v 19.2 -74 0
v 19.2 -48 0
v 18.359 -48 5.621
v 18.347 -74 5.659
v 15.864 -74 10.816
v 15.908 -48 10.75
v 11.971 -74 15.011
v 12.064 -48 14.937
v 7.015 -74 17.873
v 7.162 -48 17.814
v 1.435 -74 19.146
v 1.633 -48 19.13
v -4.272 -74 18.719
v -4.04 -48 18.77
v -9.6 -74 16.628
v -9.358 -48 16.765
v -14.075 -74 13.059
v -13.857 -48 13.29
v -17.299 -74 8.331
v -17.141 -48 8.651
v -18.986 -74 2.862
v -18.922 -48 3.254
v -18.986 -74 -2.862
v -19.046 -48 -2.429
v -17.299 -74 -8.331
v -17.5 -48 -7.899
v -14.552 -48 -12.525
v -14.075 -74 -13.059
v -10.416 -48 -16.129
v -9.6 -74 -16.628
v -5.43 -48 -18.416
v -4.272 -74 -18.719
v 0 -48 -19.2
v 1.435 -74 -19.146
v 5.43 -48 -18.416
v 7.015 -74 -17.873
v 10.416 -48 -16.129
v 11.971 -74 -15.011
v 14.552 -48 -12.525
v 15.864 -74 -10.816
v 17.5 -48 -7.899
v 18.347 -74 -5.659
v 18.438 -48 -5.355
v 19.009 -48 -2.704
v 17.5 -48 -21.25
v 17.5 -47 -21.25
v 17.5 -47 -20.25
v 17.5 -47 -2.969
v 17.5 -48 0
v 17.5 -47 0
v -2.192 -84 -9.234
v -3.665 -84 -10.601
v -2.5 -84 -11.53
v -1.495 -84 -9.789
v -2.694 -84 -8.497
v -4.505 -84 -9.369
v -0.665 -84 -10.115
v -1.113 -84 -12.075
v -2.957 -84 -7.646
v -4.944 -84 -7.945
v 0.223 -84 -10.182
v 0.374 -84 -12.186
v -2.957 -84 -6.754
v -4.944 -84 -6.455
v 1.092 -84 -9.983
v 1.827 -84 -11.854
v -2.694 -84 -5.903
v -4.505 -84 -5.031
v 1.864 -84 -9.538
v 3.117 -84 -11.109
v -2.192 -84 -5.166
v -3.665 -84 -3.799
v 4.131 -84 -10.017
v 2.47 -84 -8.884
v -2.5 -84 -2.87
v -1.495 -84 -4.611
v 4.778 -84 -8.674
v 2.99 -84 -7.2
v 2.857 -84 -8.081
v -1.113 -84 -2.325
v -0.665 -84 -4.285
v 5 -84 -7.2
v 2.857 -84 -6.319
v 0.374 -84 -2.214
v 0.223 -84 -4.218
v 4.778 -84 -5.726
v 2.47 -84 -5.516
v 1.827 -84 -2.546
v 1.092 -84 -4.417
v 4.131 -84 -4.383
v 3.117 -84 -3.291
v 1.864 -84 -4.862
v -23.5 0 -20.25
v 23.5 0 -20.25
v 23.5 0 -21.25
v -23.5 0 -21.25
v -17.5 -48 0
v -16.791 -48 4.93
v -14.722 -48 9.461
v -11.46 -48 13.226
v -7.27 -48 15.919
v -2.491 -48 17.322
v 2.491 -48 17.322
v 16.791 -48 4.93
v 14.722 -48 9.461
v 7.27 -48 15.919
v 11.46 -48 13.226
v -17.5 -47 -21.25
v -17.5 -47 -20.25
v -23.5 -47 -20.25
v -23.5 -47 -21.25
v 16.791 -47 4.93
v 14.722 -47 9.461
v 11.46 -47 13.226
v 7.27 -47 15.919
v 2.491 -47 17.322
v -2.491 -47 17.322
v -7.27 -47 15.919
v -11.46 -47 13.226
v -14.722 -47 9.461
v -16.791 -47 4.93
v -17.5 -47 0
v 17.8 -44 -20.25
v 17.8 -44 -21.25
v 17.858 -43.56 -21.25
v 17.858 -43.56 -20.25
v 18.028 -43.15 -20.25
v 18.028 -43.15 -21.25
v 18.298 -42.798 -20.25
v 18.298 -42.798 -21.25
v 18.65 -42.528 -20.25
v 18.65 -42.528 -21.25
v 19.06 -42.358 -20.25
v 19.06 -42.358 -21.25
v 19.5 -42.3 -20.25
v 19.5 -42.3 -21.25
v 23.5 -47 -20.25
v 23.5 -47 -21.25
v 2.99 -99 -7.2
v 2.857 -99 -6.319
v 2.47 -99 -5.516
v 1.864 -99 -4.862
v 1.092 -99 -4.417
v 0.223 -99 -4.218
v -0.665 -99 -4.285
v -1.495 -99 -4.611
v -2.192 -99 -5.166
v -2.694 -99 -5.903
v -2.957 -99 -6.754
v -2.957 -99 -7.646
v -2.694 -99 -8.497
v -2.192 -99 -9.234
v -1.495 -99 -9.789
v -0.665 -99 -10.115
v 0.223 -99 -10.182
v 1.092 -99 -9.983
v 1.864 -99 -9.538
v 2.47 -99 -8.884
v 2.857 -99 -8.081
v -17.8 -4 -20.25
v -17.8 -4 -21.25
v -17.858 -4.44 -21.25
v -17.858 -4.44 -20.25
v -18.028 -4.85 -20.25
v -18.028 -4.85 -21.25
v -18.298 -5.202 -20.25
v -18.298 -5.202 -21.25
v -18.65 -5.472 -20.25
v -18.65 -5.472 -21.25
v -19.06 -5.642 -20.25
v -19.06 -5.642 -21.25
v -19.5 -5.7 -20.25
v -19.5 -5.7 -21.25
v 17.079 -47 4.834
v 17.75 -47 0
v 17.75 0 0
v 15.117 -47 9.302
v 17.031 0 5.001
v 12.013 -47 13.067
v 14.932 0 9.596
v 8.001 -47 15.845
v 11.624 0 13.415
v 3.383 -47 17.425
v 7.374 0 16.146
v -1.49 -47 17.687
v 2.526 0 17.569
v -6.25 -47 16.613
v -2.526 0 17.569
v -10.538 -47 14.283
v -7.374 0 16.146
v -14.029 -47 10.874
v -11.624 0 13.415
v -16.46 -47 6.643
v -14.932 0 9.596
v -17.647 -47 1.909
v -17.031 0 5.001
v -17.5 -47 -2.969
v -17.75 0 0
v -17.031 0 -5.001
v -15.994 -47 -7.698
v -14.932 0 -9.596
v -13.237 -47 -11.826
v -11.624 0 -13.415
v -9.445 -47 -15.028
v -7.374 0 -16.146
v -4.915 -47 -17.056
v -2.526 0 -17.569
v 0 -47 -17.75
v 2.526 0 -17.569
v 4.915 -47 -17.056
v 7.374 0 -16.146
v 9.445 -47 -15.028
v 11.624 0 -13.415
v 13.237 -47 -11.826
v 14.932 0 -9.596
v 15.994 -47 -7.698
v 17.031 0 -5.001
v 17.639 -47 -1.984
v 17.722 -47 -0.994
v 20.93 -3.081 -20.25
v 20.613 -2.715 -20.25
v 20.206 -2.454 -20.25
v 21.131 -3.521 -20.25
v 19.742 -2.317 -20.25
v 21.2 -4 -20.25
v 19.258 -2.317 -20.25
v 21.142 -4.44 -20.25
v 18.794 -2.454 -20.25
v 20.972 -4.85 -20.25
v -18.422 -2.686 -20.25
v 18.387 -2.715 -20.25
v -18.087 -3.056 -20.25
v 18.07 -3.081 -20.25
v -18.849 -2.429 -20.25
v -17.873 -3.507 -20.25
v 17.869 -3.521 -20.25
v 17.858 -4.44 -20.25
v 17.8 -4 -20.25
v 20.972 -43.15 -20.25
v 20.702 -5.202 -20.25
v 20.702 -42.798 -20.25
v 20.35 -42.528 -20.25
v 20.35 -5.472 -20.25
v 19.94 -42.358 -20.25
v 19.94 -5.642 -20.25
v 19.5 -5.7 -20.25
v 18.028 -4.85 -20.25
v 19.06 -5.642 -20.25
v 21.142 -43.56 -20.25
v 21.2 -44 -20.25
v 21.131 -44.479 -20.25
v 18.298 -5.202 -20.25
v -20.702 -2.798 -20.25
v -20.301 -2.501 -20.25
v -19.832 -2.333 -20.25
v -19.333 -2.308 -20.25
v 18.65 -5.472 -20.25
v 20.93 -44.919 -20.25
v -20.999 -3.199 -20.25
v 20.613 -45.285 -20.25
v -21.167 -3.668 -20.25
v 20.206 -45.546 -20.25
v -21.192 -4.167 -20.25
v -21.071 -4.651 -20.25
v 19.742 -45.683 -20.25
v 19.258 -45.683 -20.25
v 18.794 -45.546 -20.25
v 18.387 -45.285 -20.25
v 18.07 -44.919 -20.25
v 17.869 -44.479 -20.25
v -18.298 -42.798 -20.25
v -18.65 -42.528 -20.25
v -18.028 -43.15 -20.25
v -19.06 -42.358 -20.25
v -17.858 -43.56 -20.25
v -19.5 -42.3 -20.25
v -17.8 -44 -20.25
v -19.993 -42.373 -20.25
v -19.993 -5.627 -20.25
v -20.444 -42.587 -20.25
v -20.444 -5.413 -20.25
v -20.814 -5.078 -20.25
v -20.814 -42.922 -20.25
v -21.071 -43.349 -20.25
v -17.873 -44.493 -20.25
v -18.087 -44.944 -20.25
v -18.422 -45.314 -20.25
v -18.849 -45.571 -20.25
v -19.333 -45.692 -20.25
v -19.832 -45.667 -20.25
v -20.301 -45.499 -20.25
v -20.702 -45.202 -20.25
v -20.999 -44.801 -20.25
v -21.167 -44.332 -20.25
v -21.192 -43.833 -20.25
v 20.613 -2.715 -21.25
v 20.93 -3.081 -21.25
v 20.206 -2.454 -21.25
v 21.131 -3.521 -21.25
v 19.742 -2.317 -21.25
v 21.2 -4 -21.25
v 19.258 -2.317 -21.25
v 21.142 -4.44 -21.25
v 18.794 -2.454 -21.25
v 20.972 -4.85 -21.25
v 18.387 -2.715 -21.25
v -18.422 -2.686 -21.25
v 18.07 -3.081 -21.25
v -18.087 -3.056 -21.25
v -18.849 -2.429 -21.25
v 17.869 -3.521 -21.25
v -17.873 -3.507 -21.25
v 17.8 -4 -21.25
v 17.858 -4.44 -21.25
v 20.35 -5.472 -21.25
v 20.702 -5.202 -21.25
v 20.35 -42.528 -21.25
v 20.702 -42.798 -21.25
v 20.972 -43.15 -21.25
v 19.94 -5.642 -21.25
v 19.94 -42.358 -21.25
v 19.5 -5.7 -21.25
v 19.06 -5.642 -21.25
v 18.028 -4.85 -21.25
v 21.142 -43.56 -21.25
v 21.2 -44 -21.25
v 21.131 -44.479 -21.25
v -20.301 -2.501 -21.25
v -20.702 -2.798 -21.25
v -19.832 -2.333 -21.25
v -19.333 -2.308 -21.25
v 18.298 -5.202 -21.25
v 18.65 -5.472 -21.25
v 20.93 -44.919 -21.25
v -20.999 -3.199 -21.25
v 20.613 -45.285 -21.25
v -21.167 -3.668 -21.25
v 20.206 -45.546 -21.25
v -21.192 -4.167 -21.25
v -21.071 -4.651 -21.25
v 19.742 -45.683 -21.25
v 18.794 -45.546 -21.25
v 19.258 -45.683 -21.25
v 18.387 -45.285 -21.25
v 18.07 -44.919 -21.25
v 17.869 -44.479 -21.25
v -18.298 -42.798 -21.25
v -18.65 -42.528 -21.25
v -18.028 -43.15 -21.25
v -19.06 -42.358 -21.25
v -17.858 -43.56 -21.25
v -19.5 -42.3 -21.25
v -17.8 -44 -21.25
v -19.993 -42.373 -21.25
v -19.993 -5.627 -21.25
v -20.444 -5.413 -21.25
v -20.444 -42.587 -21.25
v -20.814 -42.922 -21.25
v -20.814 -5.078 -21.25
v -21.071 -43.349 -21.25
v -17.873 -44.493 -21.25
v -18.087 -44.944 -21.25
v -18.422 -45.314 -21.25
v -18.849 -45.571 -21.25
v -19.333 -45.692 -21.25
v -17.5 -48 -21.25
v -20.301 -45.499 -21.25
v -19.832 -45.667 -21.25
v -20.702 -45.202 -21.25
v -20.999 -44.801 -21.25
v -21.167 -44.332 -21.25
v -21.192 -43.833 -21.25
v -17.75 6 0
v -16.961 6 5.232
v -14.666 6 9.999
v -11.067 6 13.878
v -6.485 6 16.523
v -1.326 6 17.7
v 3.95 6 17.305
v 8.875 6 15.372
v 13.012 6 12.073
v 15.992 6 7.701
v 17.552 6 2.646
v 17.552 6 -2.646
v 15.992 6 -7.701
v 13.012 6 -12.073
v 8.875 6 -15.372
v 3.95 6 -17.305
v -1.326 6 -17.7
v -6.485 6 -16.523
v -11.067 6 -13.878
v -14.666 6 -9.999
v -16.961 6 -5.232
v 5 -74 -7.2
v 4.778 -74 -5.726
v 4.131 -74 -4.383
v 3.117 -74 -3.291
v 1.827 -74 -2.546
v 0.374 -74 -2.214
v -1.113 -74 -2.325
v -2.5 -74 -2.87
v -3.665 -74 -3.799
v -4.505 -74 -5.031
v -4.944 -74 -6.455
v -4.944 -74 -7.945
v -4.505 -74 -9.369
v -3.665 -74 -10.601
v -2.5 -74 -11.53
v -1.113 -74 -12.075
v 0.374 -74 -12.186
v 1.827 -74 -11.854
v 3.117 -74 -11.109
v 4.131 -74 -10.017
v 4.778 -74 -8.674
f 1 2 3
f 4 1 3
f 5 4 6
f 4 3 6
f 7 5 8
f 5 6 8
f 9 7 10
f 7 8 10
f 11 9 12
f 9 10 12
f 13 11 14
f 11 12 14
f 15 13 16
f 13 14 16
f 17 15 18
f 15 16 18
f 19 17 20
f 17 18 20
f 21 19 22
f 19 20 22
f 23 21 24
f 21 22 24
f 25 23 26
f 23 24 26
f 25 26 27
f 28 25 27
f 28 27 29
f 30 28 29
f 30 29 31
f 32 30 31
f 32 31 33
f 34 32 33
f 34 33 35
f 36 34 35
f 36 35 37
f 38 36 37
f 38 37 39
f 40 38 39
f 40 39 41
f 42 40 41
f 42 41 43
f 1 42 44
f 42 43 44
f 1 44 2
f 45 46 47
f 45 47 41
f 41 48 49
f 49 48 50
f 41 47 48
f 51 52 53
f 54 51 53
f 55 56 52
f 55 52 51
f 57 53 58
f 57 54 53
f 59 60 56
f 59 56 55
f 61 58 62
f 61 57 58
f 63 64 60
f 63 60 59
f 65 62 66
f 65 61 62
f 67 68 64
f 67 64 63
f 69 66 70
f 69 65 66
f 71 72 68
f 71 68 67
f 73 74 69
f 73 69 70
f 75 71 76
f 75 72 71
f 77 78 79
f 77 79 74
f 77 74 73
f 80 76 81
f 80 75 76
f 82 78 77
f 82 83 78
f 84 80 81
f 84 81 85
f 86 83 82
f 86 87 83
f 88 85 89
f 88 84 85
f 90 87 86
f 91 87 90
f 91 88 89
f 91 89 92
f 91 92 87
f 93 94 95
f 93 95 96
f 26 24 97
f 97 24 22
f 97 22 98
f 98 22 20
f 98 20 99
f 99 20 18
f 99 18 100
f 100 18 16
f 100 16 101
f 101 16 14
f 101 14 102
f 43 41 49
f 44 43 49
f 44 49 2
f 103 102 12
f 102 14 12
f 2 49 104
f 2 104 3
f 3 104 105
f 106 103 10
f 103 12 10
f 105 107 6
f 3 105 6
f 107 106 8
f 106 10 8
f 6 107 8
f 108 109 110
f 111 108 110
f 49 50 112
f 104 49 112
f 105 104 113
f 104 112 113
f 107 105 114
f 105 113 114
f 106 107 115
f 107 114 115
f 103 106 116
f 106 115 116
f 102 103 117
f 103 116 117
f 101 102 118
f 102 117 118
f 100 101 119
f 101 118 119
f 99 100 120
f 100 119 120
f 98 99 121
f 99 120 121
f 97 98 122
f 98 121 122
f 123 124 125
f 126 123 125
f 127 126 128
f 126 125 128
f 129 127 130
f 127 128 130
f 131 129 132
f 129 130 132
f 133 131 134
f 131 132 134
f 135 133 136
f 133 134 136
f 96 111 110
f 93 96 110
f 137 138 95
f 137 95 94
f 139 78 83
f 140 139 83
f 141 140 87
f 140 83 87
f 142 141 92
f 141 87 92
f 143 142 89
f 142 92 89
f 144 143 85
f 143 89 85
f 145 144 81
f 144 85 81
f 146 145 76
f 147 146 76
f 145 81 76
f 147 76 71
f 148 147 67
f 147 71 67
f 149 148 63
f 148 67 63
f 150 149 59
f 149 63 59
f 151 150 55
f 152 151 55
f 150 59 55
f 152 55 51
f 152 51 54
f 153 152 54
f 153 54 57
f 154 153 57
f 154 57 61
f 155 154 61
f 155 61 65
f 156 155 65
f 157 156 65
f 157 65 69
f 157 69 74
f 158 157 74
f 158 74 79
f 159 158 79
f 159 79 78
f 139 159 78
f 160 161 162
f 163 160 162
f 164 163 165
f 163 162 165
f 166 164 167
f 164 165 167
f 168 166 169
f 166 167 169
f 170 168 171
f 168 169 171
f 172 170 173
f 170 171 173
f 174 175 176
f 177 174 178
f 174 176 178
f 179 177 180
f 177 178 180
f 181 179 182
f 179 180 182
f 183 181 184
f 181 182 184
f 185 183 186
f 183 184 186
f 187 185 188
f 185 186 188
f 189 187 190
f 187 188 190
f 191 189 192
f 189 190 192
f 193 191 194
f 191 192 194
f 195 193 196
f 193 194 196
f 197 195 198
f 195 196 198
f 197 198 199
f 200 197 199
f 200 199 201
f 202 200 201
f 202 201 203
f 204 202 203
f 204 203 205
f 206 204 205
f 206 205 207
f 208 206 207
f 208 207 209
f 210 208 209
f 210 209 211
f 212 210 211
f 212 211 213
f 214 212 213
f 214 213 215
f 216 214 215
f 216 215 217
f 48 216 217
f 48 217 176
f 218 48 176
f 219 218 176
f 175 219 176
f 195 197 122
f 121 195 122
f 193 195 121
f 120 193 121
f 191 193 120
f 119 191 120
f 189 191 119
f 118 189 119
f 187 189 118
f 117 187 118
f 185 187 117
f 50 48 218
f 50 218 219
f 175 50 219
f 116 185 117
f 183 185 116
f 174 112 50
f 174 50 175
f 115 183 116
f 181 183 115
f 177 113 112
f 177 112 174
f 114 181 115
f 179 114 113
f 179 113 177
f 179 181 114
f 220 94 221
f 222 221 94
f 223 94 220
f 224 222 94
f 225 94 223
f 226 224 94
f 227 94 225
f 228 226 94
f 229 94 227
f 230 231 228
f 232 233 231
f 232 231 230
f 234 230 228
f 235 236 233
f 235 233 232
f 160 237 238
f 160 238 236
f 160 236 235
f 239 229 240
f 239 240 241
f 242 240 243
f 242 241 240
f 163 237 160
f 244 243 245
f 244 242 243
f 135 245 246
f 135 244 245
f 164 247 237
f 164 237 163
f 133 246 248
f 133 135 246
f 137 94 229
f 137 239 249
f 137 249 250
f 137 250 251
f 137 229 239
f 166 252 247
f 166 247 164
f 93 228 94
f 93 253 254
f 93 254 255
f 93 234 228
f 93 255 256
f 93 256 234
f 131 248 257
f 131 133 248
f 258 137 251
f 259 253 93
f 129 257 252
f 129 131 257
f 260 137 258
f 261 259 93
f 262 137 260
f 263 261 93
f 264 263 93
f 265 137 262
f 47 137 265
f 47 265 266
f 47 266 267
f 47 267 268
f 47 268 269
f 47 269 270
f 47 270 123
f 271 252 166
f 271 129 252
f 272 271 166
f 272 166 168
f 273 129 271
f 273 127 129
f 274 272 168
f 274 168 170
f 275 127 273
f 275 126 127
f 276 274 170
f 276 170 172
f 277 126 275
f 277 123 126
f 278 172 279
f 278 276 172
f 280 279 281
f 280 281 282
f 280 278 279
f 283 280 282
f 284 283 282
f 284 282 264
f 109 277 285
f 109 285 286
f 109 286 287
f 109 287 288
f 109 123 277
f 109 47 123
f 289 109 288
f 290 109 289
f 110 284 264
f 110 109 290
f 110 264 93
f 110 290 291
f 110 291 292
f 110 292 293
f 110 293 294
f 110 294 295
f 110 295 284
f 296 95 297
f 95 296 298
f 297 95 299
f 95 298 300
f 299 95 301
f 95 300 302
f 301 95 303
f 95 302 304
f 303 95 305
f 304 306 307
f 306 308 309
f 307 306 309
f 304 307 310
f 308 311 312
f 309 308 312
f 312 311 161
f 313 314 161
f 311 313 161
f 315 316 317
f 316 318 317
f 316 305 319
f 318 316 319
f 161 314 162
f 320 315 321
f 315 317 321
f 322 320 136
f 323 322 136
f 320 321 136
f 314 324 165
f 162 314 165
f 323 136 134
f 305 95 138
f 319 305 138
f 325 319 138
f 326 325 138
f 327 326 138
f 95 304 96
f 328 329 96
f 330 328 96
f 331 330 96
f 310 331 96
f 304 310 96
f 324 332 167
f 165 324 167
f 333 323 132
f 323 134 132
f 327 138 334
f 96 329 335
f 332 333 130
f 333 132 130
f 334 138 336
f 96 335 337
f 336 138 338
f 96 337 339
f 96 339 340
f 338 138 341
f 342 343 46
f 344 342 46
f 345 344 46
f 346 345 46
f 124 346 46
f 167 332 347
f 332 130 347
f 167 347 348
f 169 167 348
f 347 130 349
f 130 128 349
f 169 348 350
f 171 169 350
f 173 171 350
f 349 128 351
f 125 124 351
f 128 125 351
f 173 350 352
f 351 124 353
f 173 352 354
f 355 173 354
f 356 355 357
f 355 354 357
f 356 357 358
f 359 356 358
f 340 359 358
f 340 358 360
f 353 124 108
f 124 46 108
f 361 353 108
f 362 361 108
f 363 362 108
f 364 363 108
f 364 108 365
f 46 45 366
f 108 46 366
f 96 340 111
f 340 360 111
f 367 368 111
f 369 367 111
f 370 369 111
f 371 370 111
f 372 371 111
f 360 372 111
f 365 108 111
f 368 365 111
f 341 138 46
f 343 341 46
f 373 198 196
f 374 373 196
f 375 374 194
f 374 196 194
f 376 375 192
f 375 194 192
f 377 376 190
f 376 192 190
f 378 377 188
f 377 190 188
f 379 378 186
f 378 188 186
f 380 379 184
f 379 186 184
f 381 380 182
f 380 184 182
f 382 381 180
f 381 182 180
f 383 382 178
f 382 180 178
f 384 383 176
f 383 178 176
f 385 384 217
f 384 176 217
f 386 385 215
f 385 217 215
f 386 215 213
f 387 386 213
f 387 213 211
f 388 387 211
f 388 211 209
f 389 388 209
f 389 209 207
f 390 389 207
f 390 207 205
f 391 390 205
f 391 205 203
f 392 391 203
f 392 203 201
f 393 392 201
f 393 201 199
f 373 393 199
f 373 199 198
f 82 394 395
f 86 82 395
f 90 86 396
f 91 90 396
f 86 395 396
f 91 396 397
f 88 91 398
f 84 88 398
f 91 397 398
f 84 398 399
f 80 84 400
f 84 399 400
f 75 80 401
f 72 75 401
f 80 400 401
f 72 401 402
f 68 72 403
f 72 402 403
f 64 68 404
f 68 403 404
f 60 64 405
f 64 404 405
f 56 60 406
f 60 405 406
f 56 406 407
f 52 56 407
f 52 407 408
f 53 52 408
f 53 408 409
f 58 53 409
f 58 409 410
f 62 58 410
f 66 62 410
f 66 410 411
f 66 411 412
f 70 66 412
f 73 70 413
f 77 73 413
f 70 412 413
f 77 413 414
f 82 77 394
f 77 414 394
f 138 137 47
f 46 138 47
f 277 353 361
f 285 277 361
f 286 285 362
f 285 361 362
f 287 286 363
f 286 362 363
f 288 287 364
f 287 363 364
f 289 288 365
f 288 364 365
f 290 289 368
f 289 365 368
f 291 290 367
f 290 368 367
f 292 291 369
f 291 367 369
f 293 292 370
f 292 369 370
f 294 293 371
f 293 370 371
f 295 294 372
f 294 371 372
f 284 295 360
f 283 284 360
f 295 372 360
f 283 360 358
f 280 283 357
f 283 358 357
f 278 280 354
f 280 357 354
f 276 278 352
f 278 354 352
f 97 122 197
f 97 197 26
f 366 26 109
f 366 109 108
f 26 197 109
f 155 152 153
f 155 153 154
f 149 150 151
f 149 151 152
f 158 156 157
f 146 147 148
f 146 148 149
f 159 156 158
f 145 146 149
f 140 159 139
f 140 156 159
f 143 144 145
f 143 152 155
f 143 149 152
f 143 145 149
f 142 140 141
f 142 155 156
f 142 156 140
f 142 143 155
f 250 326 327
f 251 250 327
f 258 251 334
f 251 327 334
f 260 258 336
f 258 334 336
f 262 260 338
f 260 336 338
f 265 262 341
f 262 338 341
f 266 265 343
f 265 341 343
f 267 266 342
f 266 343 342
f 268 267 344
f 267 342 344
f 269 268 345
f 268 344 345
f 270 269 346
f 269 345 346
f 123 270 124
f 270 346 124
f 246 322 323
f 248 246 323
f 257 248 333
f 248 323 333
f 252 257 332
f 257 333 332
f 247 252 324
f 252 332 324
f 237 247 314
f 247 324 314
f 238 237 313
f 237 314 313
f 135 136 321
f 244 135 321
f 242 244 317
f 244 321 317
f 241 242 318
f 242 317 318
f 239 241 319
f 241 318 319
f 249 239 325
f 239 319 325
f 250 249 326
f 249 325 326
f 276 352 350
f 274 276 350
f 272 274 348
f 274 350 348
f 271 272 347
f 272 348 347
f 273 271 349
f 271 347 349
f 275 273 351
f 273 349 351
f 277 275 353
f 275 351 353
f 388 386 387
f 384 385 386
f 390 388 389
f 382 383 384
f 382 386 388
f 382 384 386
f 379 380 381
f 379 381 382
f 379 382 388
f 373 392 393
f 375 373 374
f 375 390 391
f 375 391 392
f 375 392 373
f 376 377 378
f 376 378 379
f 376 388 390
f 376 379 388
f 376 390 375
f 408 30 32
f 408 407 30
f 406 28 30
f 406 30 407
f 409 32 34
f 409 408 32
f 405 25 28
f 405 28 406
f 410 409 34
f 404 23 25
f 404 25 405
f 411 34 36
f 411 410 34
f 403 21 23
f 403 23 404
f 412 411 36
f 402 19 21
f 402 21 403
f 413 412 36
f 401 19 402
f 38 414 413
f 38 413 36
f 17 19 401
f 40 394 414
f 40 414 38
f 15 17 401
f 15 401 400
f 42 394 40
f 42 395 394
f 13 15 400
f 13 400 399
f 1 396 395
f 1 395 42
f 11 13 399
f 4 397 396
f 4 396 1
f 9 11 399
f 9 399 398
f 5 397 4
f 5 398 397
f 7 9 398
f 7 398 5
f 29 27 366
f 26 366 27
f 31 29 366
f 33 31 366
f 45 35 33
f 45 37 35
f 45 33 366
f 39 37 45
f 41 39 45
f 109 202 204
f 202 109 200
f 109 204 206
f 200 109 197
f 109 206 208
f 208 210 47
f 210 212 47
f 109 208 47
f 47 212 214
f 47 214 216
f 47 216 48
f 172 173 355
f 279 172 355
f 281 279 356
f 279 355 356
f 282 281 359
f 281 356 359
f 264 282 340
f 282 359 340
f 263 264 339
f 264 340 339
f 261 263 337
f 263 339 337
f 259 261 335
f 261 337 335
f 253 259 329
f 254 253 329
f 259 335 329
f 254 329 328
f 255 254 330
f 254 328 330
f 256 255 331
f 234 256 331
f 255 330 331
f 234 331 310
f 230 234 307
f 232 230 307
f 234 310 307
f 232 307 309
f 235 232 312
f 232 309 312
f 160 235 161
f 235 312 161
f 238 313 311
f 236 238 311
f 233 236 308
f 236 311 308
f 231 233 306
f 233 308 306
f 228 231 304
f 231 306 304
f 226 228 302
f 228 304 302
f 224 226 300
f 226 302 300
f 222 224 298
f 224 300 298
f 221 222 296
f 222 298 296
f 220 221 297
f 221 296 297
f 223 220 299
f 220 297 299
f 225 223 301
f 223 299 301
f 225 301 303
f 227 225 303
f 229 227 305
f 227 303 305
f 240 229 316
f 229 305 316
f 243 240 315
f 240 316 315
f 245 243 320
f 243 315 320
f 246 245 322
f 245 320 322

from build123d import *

# Parameters (mm, degrees)
F0_R      = 17.75
F1_DEPTH  = 47
F3_DEPTH  = 1
F4_W      = 47
F4_H      = 1
F5_DEPTH  = 47
F6_R      = 19.2
F7_DEPTH  = 26
F8_R      = 17.75
F9_DEPTH  = 6
F10_R     = 2.99
F11_DEPTH = 25
F12_R     = 5
F13_DEPTH = 10
F15_DEPTH = 1


with BuildPart() as f1:
    # F0 (on Front) → F1 (new body)
    with BuildSketch(Plane.XZ):
        Circle(F0_R)
    extrude(amount=F1_DEPTH)

    # F2 (on face) → F3 (join)
    with BuildSketch(Plane.XZ.offset(47)):
        with BuildLine():
            Line((17.5, -21.25), (17.5, 0))
            ThreePointArc((17.5, 0), (0, 17.5), (-17.5, 0))
            Line((-17.5, 0), (-17.5, -21.25))
            Line((-17.5, -21.25), (17.5, -21.25))
        make_face()
    extrude(amount=F3_DEPTH)

    # F4 (on face) → F5 (join)
    with BuildSketch(Plane(origin=(0, -47, 0), x_dir=(-1, 0, 0), z_dir=(0, 1, 0))):
        with Locations((0, -20.75)):
            Rectangle(F4_W, F4_H)
    extrude(amount=F5_DEPTH)

    # F6 (on face) → F7 (join)
    with BuildSketch(Plane.XZ.offset(48)):
        Circle(F6_R)
    extrude(amount=F7_DEPTH)

    # F8 (on face) → F9 (join)
    with BuildSketch(Plane(origin=(0, 0, 0), x_dir=(-1, 0, 0), z_dir=(0, 1, 0))):
        Circle(F8_R)
    extrude(amount=F9_DEPTH)

    # F10 (on face) → F11 (join)
    with BuildSketch(Plane.XZ.offset(74)):
        with Locations((0, -7.2)):
            Circle(F10_R)
    extrude(amount=F11_DEPTH)

    # F12 (on face) → F13 (join)
    with BuildSketch(Plane.XZ.offset(74)):
        with Locations((0, -7.2)):
            Circle(F12_R)
    extrude(amount=F13_DEPTH)

    # F14 (on face) → F15 (cut, through all)
    with BuildSketch(Plane(origin=(0, 0, -21.25), x_dir=(1, 0, 0), z_dir=(0, 0, -1))):
        with BuildLine():
            ThreePointArc((19.5, 5.7), (18.297918, 5.202082), (17.8, 4))
            Line((17.8, 4), (19.5, 4))
            Line((19.5, 4), (19.5, 5.7))
        make_face()
        with BuildLine():
            Line((19.5, 4), (17.8, 4))
            ThreePointArc((17.8, 4), (19.5, 2.3), (21.2, 4))
            ThreePointArc((21.2, 4), (20.702082, 5.202082), (19.5, 5.7))
            Line((19.5, 5.7), (19.5, 4))
        make_face()
        with BuildLine():
            Line((-19.5, 4), (-17.8, 4))
            ThreePointArc((-17.8, 4), (-18.297918, 5.202082), (-19.5, 5.7))
            Line((-19.5, 5.7), (-19.5, 4))
        make_face()
        with BuildLine():
            ThreePointArc((-19.5, 5.7), (-20.702082, 2.797918), (-17.8, 4))
            Line((-17.8, 4), (-19.5, 4))
            Line((-19.5, 4), (-19.5, 5.7))
        make_face()
        with BuildLine():
            ThreePointArc((21.2, 44), (19.5, 45.7), (17.8, 44))
            Line((17.8, 44), (19.5, 44))
            Line((19.5, 44), (19.5, 42.3))
            ThreePointArc((19.5, 42.3), (20.702082, 42.797918), (21.2, 44))
        make_face()
        with BuildLine():
            Line((-19.5, 44), (-17.8, 44))
            ThreePointArc((-17.8, 44), (-20.702082, 45.202082), (-19.5, 42.3))
            Line((-19.5, 42.3), (-19.5, 44))
        make_face()
        with BuildLine():
            ThreePointArc((-19.5, 42.3), (-18.297918, 42.797918), (-17.8, 44))
            Line((-17.8, 44), (-19.5, 44))
            Line((-19.5, 44), (-19.5, 42.3))
        make_face()
        with BuildLine():
            Line((19.5, 44), (17.8, 44))
            ThreePointArc((17.8, 44), (18.297918, 42.797918), (19.5, 42.3))
            Line((19.5, 42.3), (19.5, 44))
        make_face()
    extrude(amount=-F15_DEPTH, mode=Mode.SUBTRACT)


solid = f1.part
